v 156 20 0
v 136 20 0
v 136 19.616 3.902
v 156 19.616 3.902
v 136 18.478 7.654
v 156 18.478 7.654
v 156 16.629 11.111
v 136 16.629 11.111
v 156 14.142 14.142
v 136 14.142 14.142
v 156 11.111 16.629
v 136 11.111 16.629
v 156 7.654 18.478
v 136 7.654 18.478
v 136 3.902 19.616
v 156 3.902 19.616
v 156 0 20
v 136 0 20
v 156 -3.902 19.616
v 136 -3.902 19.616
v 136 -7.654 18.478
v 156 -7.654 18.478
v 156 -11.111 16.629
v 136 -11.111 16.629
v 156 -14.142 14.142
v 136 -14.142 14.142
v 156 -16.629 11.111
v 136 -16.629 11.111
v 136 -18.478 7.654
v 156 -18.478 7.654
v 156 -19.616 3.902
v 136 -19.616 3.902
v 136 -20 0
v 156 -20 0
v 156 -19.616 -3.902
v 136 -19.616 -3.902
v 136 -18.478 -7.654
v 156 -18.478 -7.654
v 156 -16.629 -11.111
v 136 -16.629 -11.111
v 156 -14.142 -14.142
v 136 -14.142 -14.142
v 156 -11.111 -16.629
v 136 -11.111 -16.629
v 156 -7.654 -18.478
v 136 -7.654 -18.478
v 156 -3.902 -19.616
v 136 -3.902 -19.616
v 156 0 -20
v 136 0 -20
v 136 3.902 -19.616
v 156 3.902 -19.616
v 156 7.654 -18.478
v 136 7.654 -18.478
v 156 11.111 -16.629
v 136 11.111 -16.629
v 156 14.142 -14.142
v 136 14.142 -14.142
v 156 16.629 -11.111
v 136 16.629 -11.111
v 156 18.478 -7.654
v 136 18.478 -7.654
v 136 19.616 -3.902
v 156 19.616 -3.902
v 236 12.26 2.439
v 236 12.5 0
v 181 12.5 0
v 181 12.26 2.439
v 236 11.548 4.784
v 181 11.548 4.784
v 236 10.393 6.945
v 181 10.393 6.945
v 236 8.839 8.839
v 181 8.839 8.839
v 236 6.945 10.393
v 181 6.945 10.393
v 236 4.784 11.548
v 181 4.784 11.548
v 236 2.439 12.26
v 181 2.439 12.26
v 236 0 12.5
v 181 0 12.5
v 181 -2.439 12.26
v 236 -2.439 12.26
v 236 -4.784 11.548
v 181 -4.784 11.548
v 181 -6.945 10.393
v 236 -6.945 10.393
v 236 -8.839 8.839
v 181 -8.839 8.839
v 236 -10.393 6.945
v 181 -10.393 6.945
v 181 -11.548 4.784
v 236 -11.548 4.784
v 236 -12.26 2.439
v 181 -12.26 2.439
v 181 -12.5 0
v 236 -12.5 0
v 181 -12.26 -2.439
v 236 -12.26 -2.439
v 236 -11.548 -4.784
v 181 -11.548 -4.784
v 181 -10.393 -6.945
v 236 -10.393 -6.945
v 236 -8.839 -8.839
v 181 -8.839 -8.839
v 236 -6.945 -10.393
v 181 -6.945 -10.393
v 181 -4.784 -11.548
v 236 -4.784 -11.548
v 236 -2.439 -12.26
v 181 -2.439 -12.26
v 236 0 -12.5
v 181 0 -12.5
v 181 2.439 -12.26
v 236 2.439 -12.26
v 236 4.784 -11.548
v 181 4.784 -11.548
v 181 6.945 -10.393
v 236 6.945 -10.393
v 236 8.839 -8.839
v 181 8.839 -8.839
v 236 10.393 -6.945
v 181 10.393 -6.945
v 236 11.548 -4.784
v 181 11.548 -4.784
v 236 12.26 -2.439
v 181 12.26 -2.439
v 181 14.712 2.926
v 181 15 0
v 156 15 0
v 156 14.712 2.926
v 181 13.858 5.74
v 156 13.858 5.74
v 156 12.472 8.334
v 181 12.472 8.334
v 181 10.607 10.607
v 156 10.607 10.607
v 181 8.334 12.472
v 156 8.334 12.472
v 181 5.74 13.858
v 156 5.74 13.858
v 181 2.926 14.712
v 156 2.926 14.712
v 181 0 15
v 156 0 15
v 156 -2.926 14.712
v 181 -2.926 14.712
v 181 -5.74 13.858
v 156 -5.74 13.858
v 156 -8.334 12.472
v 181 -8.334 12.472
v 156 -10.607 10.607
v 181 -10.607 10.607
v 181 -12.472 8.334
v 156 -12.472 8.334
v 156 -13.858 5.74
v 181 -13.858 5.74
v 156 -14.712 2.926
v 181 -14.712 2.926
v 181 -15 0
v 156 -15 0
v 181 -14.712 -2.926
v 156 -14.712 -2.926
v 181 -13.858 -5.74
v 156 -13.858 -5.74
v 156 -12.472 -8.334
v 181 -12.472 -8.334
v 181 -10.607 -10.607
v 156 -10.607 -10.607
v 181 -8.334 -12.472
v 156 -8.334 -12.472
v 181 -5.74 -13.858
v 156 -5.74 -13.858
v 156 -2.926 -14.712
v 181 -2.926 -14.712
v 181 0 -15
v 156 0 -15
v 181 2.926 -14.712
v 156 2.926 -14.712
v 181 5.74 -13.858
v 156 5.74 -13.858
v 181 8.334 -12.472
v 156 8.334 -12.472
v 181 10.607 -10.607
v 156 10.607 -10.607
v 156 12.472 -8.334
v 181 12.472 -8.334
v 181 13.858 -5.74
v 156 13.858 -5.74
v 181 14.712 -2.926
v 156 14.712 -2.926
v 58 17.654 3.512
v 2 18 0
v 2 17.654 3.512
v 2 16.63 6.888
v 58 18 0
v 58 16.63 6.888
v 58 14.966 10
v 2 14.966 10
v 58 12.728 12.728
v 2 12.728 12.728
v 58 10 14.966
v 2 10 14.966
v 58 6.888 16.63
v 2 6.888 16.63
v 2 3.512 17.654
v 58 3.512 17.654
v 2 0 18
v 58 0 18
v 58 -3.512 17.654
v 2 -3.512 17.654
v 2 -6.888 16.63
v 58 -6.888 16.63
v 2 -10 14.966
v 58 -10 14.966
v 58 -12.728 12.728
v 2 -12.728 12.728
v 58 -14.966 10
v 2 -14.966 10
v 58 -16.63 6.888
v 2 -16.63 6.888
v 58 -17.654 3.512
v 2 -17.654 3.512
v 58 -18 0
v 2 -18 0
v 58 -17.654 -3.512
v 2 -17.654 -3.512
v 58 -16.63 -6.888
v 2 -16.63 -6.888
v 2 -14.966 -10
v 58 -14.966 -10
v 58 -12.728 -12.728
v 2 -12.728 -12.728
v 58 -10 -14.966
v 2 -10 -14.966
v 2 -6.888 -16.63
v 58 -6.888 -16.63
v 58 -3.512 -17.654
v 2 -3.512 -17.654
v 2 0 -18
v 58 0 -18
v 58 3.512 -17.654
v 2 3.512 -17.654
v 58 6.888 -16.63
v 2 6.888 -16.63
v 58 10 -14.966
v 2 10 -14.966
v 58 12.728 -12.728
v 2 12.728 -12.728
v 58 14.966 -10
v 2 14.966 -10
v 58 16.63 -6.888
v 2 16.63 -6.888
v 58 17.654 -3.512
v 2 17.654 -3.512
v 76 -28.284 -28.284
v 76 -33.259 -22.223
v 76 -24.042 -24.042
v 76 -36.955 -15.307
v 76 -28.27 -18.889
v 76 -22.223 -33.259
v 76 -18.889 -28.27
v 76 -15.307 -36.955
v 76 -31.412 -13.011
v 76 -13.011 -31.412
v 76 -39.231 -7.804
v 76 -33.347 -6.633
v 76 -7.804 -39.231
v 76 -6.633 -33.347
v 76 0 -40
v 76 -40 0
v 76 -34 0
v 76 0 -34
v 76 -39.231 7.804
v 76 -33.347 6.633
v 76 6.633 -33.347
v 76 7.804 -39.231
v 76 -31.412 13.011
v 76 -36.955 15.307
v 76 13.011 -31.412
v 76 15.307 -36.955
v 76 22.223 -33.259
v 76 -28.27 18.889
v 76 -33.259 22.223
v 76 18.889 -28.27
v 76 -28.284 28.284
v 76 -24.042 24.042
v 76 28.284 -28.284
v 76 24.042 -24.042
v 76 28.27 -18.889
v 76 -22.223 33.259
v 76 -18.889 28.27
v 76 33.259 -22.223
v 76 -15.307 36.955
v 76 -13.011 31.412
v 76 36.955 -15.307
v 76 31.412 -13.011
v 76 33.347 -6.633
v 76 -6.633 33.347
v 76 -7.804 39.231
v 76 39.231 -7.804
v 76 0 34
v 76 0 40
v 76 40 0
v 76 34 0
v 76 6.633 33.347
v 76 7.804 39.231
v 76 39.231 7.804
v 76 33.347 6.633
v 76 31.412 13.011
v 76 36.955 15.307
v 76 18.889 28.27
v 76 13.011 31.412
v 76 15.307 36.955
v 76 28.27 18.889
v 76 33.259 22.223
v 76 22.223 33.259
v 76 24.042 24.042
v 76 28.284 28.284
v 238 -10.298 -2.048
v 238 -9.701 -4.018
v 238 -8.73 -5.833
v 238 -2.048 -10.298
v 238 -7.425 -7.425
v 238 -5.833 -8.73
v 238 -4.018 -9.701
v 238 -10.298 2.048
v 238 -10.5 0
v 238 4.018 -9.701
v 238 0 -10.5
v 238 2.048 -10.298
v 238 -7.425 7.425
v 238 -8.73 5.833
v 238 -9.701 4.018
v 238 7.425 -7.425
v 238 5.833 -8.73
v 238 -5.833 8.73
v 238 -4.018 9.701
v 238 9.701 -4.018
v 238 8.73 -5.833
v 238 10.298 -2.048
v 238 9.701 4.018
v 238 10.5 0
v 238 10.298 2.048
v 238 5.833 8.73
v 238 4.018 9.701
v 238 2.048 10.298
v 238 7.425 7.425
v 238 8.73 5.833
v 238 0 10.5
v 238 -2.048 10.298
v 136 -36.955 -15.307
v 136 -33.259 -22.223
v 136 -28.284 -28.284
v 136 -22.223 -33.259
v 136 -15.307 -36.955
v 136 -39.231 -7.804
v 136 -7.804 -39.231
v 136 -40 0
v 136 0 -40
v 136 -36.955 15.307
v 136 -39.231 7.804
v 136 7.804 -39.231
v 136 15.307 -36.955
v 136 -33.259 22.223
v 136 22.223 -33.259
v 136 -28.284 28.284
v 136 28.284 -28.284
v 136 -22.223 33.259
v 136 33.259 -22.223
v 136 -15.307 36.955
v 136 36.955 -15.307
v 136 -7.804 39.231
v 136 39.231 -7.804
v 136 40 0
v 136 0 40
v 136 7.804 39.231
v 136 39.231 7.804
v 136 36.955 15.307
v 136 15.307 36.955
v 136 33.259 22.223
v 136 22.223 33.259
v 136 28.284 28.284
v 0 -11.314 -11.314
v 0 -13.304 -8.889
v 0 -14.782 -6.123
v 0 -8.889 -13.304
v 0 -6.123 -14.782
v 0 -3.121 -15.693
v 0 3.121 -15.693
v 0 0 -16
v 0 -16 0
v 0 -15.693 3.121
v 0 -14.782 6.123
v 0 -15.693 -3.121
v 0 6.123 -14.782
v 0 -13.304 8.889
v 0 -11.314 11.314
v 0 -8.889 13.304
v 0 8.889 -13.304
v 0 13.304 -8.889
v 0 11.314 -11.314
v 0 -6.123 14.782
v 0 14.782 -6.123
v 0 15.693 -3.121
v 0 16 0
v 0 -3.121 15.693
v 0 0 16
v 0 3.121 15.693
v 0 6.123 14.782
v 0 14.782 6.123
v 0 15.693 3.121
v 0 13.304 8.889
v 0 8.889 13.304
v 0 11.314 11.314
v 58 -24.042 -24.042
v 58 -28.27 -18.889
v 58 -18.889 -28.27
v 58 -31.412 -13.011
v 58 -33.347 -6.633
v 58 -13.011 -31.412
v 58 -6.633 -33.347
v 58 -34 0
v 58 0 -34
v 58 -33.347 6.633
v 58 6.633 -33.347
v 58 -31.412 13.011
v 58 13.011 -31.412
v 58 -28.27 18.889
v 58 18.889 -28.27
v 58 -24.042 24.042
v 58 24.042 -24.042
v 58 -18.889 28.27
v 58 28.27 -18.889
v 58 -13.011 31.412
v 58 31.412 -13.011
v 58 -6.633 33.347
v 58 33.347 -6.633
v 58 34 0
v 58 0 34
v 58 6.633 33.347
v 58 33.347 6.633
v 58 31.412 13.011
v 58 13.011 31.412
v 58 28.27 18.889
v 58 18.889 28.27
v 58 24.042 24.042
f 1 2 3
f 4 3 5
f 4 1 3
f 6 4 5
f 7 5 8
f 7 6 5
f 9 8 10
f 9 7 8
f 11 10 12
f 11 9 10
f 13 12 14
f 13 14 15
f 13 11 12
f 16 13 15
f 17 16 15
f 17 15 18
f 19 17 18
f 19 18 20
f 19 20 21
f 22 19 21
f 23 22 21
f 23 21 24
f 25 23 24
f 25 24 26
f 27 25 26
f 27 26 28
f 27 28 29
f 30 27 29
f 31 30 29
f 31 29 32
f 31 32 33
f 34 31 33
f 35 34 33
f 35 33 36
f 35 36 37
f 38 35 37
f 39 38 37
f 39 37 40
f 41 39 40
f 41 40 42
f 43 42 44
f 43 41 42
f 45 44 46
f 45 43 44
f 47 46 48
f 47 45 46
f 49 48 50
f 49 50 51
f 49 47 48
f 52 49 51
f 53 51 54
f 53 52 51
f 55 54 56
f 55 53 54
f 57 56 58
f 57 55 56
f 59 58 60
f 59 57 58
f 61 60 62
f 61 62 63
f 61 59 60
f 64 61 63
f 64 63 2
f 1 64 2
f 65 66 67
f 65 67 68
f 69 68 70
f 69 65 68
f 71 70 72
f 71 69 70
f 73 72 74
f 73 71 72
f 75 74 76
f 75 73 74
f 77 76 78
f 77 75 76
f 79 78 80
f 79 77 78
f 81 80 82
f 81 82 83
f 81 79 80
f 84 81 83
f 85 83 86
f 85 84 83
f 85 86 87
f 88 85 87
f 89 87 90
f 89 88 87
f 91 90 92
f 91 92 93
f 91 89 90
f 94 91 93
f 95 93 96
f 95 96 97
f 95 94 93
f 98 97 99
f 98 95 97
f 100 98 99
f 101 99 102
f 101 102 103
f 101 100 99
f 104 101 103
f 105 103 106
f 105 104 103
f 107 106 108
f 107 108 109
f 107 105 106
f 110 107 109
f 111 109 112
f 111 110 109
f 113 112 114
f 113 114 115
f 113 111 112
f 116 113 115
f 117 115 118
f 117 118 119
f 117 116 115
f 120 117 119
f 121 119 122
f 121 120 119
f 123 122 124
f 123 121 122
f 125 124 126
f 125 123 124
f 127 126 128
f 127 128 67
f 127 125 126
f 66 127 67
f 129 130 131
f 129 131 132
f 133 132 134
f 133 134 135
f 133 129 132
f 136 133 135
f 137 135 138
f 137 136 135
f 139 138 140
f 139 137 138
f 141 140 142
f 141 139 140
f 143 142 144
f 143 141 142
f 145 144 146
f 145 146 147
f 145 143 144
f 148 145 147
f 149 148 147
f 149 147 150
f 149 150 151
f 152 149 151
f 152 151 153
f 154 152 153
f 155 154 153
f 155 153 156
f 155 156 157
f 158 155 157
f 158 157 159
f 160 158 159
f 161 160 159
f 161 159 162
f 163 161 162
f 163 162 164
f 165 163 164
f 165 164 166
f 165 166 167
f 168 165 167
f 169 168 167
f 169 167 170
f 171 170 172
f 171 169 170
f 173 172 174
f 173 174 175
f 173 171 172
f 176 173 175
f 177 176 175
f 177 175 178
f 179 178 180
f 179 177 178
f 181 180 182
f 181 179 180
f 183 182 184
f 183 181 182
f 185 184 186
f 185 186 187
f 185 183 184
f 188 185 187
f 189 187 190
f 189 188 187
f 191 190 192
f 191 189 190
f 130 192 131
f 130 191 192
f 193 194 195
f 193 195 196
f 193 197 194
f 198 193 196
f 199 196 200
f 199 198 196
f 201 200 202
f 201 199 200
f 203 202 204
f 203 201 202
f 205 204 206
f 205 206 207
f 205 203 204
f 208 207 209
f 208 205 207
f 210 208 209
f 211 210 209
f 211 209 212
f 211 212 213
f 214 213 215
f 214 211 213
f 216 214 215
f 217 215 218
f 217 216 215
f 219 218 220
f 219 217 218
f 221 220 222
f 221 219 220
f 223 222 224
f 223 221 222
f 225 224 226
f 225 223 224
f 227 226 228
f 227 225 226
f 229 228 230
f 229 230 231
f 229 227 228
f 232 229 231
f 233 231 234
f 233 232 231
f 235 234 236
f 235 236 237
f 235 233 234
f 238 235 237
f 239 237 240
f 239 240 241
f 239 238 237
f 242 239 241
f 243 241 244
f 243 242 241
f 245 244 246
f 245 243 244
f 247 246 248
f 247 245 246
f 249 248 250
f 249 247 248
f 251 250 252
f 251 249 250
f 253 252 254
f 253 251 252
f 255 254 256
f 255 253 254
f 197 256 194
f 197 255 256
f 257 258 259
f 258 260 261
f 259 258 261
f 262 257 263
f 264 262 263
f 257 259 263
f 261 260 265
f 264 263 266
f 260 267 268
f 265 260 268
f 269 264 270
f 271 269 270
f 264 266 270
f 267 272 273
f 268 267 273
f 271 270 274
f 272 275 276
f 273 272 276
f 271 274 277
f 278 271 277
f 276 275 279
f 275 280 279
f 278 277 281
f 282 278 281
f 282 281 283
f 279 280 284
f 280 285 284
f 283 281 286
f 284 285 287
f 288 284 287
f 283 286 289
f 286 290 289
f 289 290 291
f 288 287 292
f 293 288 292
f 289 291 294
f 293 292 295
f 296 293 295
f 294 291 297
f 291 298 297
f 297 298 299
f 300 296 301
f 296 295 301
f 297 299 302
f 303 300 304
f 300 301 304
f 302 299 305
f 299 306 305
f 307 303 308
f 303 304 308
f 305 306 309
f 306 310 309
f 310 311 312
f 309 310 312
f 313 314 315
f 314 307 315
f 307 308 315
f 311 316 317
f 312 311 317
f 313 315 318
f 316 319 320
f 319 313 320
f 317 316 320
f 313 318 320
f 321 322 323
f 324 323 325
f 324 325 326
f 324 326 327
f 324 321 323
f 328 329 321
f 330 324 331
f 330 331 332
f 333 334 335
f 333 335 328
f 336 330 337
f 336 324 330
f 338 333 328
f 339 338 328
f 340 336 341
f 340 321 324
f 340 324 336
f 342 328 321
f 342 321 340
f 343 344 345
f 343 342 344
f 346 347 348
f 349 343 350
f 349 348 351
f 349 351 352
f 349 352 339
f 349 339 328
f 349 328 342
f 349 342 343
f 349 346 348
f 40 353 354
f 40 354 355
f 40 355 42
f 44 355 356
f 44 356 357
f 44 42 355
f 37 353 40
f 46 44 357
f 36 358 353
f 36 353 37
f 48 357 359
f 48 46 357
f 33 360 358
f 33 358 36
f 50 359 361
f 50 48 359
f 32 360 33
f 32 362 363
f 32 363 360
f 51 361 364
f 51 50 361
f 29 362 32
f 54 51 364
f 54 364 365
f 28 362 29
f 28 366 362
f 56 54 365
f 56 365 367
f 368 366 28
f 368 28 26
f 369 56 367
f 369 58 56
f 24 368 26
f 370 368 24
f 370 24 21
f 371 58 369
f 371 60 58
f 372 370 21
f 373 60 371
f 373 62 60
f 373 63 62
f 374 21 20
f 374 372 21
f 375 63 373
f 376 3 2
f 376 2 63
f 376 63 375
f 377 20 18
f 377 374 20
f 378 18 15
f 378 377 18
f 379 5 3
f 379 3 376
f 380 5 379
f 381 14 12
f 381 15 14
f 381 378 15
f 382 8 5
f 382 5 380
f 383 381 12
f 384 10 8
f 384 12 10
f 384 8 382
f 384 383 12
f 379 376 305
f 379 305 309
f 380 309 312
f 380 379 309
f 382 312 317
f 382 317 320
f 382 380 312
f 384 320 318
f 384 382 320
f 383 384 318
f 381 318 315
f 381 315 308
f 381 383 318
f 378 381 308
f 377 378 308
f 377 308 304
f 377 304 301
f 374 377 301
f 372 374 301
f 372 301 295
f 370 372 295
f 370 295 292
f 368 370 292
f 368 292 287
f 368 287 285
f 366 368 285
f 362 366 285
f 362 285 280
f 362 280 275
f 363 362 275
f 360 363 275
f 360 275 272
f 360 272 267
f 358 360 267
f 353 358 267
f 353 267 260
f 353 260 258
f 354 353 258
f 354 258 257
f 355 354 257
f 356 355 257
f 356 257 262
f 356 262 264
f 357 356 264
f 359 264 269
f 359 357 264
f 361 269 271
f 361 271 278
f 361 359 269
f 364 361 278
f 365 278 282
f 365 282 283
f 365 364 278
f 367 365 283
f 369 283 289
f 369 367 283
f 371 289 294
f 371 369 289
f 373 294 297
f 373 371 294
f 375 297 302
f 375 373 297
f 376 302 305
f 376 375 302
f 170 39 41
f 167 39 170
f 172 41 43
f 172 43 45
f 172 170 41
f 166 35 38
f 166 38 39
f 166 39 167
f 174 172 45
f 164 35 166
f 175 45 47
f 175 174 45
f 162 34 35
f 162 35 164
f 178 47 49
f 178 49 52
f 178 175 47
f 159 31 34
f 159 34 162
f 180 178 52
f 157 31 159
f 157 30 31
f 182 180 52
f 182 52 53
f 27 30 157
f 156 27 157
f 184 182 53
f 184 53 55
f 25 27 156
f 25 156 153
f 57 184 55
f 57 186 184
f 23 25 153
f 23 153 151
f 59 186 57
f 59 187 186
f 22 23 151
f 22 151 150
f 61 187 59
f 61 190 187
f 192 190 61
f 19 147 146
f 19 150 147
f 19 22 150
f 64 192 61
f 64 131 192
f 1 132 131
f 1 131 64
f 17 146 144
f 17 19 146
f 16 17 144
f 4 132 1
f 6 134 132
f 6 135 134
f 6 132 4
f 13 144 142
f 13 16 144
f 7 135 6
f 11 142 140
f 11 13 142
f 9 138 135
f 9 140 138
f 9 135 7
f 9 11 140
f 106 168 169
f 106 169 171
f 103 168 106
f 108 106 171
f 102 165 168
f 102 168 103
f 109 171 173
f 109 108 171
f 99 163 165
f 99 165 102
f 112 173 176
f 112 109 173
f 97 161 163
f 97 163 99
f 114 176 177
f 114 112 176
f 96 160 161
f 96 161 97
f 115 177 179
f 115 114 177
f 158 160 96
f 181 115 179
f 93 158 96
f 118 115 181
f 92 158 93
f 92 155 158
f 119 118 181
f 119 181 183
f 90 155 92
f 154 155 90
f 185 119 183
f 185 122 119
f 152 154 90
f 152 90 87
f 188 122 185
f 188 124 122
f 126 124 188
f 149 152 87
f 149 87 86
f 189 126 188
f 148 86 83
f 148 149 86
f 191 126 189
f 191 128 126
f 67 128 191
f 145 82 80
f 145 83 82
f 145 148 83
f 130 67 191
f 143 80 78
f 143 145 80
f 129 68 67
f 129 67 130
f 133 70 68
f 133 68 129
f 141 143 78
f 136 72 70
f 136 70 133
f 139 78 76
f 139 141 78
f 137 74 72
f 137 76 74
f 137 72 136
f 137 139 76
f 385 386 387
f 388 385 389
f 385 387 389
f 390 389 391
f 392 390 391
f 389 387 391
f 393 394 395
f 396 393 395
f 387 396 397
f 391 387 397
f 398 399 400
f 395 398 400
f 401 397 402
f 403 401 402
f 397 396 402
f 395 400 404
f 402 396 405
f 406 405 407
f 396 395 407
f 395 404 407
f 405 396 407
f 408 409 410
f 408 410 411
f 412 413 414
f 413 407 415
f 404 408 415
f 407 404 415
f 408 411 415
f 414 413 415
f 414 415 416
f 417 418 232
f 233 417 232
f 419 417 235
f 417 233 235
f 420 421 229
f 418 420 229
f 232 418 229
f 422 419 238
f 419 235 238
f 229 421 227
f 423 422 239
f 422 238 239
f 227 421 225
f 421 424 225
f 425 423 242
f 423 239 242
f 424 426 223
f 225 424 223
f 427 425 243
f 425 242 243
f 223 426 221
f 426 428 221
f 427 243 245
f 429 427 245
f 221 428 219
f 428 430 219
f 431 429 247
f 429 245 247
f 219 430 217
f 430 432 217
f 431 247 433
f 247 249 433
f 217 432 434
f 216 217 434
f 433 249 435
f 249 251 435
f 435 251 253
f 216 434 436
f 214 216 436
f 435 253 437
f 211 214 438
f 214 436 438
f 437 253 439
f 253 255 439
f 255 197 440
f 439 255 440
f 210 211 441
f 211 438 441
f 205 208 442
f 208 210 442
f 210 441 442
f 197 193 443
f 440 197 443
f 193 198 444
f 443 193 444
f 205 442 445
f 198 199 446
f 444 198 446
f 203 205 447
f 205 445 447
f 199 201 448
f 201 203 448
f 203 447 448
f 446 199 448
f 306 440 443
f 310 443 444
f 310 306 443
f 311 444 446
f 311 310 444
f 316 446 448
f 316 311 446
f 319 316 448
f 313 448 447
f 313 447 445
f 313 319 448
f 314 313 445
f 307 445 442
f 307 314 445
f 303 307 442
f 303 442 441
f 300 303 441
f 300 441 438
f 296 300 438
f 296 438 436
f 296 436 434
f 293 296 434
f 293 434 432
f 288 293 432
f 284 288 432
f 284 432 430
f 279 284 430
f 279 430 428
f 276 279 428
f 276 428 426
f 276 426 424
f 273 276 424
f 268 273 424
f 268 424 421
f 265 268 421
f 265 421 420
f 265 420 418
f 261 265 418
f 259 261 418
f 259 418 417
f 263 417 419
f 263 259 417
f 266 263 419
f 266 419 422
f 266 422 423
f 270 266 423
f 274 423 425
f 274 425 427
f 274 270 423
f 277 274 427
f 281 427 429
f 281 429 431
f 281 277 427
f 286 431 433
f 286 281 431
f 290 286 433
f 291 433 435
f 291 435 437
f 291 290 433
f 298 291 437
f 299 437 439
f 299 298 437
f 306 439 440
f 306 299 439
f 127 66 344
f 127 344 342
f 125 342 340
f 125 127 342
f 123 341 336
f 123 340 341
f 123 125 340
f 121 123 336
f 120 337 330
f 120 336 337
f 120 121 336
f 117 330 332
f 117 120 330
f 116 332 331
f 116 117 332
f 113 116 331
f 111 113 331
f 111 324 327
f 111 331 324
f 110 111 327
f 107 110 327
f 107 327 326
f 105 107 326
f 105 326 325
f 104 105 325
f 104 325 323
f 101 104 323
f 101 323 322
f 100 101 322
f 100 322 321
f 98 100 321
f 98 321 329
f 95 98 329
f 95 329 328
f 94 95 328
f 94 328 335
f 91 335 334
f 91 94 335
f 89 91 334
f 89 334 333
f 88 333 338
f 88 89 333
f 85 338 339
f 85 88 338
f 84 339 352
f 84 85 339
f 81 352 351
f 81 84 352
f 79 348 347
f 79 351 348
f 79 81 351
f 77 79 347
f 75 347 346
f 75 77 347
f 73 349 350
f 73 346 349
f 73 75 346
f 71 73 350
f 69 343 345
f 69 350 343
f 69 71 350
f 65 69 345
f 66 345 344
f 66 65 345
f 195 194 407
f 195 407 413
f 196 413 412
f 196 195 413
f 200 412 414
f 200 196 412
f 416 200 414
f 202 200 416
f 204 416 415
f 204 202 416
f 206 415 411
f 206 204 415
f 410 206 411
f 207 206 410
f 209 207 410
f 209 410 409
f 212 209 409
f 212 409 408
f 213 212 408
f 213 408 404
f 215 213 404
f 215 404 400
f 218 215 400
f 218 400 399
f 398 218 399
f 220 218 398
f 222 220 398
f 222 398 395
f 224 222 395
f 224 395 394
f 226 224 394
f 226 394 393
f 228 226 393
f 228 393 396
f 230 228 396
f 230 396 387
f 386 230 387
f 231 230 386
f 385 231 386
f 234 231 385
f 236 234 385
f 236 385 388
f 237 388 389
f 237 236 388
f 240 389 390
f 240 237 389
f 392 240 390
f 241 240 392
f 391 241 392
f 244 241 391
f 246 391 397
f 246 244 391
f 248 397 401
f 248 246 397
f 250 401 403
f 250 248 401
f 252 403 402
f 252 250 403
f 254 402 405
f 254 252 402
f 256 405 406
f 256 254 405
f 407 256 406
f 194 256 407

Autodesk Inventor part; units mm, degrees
ref_plane "Start Plane" through (0, 0, 0) normal (1, 0, 0) x (0, 1, 0)
ref_plane "XZ Plane" through (0, 0, 0) normal (0, 1, 0) x (-1, 0, 0)
ref_plane "XY Plane" through (0, 0, 0) normal (0, 0, 1) x (1, 0, 0)
sketch "Main Sketch" plane through (0, 0, 0) normal (0, 0, 1) x (1, 0, 0)
  line L0 (0, 0) -> (238, 0)
  line L1 (0, 0) -> (0, 18)
  line L2 (0, 18) -> (58, 18)
  line L3 (58, 18) -> (58, 34)
  line L4 (76, 34) -> (76, 40)
  line L5 (58, 34) -> (76, 34)
  line L6 (136, 40) -> (136, 20)
  line L7 (76, 40) -> (136, 40)
  line L8 (156, 20) -> (156, 15)
  line L9 (136, 20) -> (156, 20)
  line L10 (181, 15) -> (181, 12.5)
  line L11 (156, 15) -> (181, 15)
  line L12 (238, 12.5) -> (238, 0)
  line L13 (181, 12.5) -> (238, 12.5)
  dimension "d3" = 36
  dimension "d4" = 68
  dimension "d5" = 80
  dimension "d6" = 40
  dimension "d7" = 30
  dimension "d8" = 25
revolve "Revolution1" add sketch "Main Sketch" angle 360 about axis through (0, 0, 0) along (1, 0, 0)
chamfer "Chamfer1" distance 2 angle 45 1 edges at (0, -18, 0) measured on face at (38.6667, 17.7669, -2.8874)
chamfer "Chamfer2" distance 2 angle 45 1 edges at (238, -12.5, 0) measured on face at (219, 12.4595, -1.0058)
equation "\"Length\" = 238"
properties part number "Shaft" material "Steel"
